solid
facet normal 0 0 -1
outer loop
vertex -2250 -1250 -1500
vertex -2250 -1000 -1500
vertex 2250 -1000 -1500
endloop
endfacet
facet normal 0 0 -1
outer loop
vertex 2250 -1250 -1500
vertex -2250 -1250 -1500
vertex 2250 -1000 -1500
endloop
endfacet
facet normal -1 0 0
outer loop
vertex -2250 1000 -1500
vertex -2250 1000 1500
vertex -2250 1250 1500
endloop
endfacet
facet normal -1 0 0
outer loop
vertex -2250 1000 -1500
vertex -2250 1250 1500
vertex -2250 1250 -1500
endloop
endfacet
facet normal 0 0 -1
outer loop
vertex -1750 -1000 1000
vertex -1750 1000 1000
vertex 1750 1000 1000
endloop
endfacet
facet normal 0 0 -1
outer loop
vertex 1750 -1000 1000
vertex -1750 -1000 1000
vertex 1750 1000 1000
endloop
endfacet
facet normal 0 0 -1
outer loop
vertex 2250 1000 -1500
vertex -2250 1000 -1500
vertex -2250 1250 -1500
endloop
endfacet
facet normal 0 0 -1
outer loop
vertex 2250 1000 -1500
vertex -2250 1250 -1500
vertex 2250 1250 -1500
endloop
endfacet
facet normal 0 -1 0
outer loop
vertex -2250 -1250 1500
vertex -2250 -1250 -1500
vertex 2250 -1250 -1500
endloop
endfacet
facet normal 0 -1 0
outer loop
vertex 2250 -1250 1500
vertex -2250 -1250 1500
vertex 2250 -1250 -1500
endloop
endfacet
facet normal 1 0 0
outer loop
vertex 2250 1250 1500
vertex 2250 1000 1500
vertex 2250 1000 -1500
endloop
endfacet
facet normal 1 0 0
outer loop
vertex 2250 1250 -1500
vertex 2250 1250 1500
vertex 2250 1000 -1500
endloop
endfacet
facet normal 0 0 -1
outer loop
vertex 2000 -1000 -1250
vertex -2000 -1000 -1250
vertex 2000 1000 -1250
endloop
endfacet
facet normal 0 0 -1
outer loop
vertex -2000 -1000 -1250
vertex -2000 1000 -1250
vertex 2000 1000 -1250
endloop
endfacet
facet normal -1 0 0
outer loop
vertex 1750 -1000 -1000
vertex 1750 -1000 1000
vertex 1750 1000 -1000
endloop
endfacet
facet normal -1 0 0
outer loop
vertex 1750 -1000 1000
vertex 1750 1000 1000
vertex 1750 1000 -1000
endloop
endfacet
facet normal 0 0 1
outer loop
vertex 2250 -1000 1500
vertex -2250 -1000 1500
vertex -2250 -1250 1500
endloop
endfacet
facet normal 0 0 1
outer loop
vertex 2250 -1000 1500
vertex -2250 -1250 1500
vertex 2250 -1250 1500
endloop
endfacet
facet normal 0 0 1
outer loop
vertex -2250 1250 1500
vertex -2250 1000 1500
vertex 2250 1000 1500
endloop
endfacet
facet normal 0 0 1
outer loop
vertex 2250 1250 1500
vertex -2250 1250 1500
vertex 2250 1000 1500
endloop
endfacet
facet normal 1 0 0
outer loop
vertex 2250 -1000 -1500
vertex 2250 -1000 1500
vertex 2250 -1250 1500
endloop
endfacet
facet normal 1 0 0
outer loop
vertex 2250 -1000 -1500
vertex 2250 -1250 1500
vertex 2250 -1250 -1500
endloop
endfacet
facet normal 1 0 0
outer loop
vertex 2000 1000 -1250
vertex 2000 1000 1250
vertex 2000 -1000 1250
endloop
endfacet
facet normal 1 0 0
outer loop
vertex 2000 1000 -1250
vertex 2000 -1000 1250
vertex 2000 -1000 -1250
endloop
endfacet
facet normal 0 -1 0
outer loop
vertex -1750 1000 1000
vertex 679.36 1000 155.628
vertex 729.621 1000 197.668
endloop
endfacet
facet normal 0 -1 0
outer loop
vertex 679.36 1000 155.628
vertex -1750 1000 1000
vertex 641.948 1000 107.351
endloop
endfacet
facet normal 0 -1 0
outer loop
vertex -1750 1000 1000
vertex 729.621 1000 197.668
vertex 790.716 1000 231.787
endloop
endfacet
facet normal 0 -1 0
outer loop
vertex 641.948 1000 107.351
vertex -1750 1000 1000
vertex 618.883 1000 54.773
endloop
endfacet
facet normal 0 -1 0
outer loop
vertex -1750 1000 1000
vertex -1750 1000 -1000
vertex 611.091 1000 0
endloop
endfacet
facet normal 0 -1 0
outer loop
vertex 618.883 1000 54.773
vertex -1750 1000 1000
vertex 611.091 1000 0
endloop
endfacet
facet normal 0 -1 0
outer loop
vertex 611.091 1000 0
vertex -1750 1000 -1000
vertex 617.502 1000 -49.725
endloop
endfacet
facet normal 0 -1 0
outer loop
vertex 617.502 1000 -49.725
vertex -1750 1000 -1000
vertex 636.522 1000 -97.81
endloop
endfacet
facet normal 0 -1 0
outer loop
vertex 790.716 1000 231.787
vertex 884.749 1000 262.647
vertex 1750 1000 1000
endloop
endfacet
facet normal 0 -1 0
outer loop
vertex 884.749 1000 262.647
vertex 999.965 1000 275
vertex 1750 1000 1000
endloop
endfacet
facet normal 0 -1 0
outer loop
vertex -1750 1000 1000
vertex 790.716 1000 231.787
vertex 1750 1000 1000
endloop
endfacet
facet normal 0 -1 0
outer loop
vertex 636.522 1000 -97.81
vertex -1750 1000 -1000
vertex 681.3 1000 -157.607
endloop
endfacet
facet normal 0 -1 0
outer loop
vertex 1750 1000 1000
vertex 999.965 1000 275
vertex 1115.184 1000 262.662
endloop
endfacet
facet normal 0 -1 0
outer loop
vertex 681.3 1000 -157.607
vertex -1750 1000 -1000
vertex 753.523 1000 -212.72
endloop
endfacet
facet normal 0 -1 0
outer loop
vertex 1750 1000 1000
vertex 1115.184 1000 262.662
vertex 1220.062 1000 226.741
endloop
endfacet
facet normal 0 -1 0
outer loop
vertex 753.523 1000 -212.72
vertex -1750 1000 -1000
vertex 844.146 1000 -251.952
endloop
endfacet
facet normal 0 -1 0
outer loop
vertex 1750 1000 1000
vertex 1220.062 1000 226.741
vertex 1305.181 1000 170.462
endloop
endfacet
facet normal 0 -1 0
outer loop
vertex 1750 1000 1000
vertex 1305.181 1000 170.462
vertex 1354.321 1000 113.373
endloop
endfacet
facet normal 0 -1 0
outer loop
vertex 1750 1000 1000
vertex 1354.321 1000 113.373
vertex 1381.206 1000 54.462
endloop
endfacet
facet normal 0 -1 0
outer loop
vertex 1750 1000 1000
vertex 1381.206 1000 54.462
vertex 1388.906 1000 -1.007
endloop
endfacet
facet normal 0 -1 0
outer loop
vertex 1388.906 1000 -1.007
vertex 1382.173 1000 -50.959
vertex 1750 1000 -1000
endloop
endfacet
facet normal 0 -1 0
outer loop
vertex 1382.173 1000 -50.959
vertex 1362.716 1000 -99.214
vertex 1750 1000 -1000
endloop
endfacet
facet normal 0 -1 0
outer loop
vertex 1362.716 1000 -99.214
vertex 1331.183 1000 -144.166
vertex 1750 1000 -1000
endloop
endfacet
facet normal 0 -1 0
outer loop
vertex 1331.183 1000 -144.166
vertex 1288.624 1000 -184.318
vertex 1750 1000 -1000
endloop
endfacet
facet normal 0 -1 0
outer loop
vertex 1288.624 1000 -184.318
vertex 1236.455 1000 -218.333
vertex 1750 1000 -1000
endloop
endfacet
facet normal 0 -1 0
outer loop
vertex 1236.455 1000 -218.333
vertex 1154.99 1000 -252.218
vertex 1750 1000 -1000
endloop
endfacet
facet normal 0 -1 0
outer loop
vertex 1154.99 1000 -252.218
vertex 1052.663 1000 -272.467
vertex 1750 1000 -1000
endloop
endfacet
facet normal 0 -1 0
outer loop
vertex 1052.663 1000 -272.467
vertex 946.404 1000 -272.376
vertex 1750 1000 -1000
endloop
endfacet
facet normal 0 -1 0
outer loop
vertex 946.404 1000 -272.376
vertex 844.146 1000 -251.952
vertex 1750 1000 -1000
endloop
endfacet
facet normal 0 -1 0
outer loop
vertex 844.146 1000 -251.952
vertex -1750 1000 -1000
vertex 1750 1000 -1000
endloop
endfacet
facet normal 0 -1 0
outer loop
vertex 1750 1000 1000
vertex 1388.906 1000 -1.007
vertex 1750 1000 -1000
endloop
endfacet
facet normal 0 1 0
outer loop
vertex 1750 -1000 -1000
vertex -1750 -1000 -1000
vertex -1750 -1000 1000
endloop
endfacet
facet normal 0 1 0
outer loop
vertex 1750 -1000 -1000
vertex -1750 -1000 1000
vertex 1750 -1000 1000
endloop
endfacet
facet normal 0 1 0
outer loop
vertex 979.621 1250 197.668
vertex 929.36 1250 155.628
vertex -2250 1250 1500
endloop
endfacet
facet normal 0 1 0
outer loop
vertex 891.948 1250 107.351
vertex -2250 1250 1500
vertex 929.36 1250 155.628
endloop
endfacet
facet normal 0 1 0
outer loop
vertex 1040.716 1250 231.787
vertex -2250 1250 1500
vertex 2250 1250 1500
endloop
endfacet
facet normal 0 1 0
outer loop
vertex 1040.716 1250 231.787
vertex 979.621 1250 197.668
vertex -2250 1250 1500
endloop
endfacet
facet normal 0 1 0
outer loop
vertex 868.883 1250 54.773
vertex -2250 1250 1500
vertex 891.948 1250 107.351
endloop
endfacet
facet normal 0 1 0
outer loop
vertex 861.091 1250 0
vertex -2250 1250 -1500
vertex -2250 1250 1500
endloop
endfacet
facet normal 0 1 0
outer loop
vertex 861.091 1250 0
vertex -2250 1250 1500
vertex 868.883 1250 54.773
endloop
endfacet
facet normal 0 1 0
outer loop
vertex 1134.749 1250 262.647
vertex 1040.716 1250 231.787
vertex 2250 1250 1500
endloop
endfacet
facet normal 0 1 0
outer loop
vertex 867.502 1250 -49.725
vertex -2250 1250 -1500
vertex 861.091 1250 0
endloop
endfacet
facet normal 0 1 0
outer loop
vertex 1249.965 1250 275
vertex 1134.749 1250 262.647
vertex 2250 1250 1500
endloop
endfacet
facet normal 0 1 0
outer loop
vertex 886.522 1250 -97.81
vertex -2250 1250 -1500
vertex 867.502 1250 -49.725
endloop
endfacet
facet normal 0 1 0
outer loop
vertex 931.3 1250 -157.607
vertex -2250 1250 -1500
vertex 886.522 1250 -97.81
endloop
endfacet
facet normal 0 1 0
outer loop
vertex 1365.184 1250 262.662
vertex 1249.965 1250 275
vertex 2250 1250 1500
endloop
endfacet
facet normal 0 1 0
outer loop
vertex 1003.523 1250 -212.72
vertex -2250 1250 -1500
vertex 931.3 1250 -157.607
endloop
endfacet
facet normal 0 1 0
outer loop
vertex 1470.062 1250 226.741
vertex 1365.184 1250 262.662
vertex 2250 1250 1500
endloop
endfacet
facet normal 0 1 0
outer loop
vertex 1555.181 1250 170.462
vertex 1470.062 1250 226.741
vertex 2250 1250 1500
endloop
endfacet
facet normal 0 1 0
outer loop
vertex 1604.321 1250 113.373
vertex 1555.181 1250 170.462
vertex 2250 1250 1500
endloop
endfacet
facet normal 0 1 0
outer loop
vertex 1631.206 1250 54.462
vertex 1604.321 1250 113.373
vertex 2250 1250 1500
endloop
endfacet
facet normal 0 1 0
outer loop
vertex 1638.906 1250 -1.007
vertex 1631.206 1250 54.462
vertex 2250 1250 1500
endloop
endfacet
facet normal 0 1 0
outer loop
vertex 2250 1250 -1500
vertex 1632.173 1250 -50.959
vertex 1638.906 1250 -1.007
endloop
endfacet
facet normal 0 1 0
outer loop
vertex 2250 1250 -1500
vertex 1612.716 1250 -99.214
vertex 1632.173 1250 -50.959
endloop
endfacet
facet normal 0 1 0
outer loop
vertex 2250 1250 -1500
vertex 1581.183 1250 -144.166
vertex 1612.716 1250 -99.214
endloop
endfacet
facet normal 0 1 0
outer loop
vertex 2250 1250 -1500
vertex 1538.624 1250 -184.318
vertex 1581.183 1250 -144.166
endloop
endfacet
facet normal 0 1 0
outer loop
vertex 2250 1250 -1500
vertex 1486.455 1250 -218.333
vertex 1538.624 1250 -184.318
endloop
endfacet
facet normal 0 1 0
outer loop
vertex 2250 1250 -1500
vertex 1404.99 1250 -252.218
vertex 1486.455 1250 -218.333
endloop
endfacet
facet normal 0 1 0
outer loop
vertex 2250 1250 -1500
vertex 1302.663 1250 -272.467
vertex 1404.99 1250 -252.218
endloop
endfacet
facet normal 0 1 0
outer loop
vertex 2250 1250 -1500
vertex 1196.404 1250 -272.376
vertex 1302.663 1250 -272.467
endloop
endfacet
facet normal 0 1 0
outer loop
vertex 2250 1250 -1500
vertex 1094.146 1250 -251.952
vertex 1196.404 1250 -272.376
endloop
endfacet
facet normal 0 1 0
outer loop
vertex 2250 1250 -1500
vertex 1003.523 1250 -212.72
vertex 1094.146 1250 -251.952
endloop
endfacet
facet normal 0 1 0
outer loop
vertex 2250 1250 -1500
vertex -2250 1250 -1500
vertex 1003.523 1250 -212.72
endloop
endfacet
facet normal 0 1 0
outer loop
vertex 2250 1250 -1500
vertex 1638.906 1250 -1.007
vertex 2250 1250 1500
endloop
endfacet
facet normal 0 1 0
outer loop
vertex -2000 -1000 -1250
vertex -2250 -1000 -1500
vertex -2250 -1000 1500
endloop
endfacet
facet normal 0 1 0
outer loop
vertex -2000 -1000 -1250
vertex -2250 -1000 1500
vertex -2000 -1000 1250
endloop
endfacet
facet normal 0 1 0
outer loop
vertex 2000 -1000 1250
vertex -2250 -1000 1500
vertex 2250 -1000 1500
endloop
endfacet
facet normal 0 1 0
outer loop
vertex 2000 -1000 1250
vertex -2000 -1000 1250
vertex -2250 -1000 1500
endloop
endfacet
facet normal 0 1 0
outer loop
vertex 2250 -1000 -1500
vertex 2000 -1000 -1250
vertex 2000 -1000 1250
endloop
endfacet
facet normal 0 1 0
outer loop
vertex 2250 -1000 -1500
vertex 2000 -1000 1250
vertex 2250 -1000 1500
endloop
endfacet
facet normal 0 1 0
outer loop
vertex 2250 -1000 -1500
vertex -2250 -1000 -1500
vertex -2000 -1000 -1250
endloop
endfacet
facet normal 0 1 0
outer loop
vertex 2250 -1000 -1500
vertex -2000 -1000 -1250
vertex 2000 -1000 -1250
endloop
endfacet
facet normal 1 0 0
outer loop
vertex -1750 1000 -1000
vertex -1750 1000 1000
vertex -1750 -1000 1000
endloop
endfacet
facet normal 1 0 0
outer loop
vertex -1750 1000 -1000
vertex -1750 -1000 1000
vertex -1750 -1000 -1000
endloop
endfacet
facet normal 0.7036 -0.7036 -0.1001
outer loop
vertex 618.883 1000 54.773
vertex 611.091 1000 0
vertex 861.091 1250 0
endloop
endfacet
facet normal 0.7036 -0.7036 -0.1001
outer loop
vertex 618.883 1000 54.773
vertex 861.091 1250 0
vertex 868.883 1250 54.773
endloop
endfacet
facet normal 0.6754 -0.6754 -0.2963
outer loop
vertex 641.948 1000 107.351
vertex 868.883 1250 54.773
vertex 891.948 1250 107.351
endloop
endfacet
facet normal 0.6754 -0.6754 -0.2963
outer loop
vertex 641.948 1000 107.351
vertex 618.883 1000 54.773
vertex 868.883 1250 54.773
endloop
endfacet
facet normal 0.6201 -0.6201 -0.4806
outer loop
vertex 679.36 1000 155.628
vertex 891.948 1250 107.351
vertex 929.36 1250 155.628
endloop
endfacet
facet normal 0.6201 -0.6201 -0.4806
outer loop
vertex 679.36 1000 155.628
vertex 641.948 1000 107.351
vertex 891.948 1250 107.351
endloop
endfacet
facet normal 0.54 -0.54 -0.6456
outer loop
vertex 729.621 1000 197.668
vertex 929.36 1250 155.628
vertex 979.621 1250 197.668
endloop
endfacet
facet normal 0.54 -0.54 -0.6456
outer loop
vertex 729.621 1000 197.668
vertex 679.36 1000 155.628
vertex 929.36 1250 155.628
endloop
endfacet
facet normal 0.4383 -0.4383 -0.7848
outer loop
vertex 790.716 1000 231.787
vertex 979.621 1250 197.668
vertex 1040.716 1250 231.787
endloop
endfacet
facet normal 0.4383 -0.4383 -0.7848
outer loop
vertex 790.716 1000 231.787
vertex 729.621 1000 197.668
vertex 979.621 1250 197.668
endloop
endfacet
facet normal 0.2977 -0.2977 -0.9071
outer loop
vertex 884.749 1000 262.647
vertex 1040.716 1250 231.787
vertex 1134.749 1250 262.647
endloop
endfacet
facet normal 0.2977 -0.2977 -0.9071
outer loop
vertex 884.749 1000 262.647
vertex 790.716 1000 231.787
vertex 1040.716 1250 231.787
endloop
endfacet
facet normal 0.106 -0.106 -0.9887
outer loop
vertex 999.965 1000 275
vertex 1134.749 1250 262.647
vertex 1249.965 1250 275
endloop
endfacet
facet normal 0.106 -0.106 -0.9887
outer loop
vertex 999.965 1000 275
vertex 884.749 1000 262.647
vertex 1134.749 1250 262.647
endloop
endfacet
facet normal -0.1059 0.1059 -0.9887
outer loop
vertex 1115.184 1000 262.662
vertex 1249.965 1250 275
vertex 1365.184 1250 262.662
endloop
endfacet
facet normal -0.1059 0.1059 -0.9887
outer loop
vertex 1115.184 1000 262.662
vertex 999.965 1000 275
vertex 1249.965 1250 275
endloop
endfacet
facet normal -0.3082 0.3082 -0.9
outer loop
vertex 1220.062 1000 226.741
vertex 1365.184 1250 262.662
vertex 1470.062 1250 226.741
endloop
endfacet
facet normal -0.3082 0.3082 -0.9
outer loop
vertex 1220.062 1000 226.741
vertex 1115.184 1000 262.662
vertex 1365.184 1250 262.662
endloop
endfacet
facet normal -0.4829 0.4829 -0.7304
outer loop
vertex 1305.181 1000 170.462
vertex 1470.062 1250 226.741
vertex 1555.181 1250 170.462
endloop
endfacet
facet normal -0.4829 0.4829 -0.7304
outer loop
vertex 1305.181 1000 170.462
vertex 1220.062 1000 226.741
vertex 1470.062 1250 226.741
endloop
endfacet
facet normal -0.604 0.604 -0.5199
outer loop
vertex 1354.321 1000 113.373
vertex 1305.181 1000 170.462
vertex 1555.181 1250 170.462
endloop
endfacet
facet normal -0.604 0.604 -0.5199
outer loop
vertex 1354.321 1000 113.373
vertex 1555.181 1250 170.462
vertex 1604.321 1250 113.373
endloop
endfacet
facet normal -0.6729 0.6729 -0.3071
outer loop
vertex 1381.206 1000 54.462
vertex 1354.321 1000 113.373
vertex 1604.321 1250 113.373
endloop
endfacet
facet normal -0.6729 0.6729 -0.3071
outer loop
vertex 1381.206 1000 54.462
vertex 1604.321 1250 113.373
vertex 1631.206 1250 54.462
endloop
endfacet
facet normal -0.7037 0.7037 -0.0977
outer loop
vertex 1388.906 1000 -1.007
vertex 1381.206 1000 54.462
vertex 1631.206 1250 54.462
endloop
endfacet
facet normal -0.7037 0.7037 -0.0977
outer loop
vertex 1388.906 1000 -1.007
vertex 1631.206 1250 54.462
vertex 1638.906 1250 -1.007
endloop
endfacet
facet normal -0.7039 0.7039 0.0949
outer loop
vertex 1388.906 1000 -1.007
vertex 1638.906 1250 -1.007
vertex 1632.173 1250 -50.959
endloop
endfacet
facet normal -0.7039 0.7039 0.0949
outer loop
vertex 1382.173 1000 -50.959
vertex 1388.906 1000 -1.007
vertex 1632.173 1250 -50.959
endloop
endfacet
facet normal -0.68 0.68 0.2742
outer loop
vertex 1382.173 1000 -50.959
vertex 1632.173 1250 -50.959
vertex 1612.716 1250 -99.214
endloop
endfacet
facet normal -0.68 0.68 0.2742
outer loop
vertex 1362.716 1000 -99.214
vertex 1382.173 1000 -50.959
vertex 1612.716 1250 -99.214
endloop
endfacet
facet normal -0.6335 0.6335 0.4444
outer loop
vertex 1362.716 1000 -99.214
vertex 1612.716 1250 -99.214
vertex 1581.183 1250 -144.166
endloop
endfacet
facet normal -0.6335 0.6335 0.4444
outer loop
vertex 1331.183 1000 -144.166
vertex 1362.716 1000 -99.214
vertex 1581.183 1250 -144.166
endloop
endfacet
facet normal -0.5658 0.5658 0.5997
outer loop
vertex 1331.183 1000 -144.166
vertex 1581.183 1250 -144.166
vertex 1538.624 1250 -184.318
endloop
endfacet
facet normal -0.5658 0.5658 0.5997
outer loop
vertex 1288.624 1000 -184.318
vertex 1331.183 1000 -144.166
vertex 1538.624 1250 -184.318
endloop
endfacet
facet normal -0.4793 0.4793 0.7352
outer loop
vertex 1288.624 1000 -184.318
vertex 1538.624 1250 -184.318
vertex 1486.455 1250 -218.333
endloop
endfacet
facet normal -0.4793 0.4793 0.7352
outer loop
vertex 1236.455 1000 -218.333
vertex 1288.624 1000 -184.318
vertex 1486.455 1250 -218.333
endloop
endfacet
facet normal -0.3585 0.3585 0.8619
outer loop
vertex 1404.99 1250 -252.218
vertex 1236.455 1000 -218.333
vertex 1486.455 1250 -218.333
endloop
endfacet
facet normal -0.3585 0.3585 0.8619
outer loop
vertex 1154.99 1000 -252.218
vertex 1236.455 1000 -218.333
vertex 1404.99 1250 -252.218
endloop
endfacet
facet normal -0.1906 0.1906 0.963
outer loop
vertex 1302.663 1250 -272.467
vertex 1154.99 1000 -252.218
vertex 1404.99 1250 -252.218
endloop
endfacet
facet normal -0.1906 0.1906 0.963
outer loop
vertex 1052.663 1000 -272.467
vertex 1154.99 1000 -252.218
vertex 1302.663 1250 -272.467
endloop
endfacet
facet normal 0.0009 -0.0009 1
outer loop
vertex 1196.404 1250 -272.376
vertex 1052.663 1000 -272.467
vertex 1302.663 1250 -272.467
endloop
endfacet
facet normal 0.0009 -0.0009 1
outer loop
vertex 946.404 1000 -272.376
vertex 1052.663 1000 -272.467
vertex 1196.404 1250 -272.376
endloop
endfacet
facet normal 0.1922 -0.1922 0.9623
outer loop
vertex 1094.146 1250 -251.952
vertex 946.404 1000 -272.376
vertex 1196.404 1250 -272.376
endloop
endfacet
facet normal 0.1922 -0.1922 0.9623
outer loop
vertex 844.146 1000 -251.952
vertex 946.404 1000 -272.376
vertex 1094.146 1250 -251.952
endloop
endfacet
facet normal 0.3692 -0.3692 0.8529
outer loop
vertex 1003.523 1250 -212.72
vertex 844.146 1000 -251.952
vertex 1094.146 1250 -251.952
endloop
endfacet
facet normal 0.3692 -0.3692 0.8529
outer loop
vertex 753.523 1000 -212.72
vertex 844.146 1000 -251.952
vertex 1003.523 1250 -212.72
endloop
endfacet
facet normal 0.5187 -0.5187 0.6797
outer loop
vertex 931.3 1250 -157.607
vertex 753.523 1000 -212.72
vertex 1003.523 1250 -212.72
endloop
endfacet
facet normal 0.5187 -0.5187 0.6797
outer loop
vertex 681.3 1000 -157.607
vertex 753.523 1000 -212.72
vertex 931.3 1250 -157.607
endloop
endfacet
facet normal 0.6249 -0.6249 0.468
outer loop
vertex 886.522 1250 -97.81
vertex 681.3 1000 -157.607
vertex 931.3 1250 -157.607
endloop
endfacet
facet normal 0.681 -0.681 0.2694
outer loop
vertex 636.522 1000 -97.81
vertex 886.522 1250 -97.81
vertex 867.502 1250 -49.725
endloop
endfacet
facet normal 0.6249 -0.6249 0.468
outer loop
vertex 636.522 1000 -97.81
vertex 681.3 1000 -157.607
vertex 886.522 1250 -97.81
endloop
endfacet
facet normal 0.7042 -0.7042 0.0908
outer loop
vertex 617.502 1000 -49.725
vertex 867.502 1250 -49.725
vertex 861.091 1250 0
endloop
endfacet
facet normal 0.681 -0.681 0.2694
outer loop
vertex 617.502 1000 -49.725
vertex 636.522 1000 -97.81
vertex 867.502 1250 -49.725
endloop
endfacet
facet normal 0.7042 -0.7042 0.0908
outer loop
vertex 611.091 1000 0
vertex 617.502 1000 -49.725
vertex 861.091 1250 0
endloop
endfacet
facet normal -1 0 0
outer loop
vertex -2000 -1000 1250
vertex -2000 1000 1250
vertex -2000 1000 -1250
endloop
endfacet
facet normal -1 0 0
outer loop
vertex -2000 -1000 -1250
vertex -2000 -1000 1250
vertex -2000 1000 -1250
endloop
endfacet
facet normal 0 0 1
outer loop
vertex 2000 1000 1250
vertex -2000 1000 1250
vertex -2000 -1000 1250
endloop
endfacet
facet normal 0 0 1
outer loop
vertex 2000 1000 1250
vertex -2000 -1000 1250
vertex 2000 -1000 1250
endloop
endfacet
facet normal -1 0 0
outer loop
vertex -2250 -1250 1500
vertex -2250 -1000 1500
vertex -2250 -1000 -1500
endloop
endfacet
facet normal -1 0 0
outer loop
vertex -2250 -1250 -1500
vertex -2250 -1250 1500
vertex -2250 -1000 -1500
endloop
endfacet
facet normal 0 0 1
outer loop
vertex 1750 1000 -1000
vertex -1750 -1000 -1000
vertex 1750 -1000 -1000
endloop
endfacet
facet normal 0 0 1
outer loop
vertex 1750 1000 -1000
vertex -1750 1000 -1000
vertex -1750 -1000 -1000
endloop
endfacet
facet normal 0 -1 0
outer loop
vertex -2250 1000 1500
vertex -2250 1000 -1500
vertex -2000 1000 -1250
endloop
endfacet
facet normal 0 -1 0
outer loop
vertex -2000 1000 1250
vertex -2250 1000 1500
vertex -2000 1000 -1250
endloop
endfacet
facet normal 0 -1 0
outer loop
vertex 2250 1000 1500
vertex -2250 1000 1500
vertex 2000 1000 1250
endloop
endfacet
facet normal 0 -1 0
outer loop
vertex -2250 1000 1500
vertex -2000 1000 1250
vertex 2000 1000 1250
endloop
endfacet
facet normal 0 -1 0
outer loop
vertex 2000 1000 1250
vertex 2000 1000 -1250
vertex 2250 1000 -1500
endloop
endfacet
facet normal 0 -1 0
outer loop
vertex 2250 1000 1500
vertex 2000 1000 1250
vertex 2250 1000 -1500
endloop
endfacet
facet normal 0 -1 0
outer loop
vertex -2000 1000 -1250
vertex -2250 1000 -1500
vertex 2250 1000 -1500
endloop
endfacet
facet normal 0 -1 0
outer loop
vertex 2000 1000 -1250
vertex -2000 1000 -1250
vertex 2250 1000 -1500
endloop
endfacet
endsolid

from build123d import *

# Parameters (mm, degrees)
SKETCH1_W           = 4000
SKETCH1_H           = 2500
SKETCH1_W_2         = 3500
SKETCH1_H_2         = 2000
BOSS_EXTRUDE2_DEPTH = 1000
SKETCH4_W           = 4500
SKETCH4_H           = 3000
BOSS_EXTRUDE3_DEPTH = 250
SKETCH7_R           = 275
CUT_EXTRUDE1_DEPTH  = 3746.831015943


with BuildPart() as part:
    # Sketch1 → Boss-Extrude2 (new, symmetric)
    with BuildSketch(Plane(origin=(0, 0, 0), x_dir=(1, 0, 0), z_dir=(0, 1, 0))):
        Rectangle(SKETCH1_W, SKETCH1_H)
        Rectangle(SKETCH1_W_2, SKETCH1_H_2, mode=Mode.SUBTRACT)
    extrude(amount=BOSS_EXTRUDE2_DEPTH, both=True)

    # Sketch4 → Boss-Extrude3 (add)
    with BuildSketch(Plane(origin=(0, 1000, 0), x_dir=(1, 0, 0), z_dir=(0, 1, 0))):
        Rectangle(SKETCH4_W, SKETCH4_H)
    boss_extrude3 = extrude(amount=BOSS_EXTRUDE3_DEPTH)

    # Mirror1: Boss-Extrude3 across plane
    add(boss_extrude3.mirror(Plane.ZX))

    # Sketch7 → Cut-Extrude1 (cut, through all)
    with BuildSketch(Plane(origin=(625, 625, 0), x_dir=(0.7071067811865477, -0.7071067811865475, 0), z_dir=(0.7071067811865475, 0.7071067811865477, 0))):
        with Locations(Location((0, 0, 0), (0, 0, 180))):
            Circle(SKETCH7_R)
    extrude(amount=CUT_EXTRUDE1_DEPTH, mode=Mode.SUBTRACT)


solid = part.part
